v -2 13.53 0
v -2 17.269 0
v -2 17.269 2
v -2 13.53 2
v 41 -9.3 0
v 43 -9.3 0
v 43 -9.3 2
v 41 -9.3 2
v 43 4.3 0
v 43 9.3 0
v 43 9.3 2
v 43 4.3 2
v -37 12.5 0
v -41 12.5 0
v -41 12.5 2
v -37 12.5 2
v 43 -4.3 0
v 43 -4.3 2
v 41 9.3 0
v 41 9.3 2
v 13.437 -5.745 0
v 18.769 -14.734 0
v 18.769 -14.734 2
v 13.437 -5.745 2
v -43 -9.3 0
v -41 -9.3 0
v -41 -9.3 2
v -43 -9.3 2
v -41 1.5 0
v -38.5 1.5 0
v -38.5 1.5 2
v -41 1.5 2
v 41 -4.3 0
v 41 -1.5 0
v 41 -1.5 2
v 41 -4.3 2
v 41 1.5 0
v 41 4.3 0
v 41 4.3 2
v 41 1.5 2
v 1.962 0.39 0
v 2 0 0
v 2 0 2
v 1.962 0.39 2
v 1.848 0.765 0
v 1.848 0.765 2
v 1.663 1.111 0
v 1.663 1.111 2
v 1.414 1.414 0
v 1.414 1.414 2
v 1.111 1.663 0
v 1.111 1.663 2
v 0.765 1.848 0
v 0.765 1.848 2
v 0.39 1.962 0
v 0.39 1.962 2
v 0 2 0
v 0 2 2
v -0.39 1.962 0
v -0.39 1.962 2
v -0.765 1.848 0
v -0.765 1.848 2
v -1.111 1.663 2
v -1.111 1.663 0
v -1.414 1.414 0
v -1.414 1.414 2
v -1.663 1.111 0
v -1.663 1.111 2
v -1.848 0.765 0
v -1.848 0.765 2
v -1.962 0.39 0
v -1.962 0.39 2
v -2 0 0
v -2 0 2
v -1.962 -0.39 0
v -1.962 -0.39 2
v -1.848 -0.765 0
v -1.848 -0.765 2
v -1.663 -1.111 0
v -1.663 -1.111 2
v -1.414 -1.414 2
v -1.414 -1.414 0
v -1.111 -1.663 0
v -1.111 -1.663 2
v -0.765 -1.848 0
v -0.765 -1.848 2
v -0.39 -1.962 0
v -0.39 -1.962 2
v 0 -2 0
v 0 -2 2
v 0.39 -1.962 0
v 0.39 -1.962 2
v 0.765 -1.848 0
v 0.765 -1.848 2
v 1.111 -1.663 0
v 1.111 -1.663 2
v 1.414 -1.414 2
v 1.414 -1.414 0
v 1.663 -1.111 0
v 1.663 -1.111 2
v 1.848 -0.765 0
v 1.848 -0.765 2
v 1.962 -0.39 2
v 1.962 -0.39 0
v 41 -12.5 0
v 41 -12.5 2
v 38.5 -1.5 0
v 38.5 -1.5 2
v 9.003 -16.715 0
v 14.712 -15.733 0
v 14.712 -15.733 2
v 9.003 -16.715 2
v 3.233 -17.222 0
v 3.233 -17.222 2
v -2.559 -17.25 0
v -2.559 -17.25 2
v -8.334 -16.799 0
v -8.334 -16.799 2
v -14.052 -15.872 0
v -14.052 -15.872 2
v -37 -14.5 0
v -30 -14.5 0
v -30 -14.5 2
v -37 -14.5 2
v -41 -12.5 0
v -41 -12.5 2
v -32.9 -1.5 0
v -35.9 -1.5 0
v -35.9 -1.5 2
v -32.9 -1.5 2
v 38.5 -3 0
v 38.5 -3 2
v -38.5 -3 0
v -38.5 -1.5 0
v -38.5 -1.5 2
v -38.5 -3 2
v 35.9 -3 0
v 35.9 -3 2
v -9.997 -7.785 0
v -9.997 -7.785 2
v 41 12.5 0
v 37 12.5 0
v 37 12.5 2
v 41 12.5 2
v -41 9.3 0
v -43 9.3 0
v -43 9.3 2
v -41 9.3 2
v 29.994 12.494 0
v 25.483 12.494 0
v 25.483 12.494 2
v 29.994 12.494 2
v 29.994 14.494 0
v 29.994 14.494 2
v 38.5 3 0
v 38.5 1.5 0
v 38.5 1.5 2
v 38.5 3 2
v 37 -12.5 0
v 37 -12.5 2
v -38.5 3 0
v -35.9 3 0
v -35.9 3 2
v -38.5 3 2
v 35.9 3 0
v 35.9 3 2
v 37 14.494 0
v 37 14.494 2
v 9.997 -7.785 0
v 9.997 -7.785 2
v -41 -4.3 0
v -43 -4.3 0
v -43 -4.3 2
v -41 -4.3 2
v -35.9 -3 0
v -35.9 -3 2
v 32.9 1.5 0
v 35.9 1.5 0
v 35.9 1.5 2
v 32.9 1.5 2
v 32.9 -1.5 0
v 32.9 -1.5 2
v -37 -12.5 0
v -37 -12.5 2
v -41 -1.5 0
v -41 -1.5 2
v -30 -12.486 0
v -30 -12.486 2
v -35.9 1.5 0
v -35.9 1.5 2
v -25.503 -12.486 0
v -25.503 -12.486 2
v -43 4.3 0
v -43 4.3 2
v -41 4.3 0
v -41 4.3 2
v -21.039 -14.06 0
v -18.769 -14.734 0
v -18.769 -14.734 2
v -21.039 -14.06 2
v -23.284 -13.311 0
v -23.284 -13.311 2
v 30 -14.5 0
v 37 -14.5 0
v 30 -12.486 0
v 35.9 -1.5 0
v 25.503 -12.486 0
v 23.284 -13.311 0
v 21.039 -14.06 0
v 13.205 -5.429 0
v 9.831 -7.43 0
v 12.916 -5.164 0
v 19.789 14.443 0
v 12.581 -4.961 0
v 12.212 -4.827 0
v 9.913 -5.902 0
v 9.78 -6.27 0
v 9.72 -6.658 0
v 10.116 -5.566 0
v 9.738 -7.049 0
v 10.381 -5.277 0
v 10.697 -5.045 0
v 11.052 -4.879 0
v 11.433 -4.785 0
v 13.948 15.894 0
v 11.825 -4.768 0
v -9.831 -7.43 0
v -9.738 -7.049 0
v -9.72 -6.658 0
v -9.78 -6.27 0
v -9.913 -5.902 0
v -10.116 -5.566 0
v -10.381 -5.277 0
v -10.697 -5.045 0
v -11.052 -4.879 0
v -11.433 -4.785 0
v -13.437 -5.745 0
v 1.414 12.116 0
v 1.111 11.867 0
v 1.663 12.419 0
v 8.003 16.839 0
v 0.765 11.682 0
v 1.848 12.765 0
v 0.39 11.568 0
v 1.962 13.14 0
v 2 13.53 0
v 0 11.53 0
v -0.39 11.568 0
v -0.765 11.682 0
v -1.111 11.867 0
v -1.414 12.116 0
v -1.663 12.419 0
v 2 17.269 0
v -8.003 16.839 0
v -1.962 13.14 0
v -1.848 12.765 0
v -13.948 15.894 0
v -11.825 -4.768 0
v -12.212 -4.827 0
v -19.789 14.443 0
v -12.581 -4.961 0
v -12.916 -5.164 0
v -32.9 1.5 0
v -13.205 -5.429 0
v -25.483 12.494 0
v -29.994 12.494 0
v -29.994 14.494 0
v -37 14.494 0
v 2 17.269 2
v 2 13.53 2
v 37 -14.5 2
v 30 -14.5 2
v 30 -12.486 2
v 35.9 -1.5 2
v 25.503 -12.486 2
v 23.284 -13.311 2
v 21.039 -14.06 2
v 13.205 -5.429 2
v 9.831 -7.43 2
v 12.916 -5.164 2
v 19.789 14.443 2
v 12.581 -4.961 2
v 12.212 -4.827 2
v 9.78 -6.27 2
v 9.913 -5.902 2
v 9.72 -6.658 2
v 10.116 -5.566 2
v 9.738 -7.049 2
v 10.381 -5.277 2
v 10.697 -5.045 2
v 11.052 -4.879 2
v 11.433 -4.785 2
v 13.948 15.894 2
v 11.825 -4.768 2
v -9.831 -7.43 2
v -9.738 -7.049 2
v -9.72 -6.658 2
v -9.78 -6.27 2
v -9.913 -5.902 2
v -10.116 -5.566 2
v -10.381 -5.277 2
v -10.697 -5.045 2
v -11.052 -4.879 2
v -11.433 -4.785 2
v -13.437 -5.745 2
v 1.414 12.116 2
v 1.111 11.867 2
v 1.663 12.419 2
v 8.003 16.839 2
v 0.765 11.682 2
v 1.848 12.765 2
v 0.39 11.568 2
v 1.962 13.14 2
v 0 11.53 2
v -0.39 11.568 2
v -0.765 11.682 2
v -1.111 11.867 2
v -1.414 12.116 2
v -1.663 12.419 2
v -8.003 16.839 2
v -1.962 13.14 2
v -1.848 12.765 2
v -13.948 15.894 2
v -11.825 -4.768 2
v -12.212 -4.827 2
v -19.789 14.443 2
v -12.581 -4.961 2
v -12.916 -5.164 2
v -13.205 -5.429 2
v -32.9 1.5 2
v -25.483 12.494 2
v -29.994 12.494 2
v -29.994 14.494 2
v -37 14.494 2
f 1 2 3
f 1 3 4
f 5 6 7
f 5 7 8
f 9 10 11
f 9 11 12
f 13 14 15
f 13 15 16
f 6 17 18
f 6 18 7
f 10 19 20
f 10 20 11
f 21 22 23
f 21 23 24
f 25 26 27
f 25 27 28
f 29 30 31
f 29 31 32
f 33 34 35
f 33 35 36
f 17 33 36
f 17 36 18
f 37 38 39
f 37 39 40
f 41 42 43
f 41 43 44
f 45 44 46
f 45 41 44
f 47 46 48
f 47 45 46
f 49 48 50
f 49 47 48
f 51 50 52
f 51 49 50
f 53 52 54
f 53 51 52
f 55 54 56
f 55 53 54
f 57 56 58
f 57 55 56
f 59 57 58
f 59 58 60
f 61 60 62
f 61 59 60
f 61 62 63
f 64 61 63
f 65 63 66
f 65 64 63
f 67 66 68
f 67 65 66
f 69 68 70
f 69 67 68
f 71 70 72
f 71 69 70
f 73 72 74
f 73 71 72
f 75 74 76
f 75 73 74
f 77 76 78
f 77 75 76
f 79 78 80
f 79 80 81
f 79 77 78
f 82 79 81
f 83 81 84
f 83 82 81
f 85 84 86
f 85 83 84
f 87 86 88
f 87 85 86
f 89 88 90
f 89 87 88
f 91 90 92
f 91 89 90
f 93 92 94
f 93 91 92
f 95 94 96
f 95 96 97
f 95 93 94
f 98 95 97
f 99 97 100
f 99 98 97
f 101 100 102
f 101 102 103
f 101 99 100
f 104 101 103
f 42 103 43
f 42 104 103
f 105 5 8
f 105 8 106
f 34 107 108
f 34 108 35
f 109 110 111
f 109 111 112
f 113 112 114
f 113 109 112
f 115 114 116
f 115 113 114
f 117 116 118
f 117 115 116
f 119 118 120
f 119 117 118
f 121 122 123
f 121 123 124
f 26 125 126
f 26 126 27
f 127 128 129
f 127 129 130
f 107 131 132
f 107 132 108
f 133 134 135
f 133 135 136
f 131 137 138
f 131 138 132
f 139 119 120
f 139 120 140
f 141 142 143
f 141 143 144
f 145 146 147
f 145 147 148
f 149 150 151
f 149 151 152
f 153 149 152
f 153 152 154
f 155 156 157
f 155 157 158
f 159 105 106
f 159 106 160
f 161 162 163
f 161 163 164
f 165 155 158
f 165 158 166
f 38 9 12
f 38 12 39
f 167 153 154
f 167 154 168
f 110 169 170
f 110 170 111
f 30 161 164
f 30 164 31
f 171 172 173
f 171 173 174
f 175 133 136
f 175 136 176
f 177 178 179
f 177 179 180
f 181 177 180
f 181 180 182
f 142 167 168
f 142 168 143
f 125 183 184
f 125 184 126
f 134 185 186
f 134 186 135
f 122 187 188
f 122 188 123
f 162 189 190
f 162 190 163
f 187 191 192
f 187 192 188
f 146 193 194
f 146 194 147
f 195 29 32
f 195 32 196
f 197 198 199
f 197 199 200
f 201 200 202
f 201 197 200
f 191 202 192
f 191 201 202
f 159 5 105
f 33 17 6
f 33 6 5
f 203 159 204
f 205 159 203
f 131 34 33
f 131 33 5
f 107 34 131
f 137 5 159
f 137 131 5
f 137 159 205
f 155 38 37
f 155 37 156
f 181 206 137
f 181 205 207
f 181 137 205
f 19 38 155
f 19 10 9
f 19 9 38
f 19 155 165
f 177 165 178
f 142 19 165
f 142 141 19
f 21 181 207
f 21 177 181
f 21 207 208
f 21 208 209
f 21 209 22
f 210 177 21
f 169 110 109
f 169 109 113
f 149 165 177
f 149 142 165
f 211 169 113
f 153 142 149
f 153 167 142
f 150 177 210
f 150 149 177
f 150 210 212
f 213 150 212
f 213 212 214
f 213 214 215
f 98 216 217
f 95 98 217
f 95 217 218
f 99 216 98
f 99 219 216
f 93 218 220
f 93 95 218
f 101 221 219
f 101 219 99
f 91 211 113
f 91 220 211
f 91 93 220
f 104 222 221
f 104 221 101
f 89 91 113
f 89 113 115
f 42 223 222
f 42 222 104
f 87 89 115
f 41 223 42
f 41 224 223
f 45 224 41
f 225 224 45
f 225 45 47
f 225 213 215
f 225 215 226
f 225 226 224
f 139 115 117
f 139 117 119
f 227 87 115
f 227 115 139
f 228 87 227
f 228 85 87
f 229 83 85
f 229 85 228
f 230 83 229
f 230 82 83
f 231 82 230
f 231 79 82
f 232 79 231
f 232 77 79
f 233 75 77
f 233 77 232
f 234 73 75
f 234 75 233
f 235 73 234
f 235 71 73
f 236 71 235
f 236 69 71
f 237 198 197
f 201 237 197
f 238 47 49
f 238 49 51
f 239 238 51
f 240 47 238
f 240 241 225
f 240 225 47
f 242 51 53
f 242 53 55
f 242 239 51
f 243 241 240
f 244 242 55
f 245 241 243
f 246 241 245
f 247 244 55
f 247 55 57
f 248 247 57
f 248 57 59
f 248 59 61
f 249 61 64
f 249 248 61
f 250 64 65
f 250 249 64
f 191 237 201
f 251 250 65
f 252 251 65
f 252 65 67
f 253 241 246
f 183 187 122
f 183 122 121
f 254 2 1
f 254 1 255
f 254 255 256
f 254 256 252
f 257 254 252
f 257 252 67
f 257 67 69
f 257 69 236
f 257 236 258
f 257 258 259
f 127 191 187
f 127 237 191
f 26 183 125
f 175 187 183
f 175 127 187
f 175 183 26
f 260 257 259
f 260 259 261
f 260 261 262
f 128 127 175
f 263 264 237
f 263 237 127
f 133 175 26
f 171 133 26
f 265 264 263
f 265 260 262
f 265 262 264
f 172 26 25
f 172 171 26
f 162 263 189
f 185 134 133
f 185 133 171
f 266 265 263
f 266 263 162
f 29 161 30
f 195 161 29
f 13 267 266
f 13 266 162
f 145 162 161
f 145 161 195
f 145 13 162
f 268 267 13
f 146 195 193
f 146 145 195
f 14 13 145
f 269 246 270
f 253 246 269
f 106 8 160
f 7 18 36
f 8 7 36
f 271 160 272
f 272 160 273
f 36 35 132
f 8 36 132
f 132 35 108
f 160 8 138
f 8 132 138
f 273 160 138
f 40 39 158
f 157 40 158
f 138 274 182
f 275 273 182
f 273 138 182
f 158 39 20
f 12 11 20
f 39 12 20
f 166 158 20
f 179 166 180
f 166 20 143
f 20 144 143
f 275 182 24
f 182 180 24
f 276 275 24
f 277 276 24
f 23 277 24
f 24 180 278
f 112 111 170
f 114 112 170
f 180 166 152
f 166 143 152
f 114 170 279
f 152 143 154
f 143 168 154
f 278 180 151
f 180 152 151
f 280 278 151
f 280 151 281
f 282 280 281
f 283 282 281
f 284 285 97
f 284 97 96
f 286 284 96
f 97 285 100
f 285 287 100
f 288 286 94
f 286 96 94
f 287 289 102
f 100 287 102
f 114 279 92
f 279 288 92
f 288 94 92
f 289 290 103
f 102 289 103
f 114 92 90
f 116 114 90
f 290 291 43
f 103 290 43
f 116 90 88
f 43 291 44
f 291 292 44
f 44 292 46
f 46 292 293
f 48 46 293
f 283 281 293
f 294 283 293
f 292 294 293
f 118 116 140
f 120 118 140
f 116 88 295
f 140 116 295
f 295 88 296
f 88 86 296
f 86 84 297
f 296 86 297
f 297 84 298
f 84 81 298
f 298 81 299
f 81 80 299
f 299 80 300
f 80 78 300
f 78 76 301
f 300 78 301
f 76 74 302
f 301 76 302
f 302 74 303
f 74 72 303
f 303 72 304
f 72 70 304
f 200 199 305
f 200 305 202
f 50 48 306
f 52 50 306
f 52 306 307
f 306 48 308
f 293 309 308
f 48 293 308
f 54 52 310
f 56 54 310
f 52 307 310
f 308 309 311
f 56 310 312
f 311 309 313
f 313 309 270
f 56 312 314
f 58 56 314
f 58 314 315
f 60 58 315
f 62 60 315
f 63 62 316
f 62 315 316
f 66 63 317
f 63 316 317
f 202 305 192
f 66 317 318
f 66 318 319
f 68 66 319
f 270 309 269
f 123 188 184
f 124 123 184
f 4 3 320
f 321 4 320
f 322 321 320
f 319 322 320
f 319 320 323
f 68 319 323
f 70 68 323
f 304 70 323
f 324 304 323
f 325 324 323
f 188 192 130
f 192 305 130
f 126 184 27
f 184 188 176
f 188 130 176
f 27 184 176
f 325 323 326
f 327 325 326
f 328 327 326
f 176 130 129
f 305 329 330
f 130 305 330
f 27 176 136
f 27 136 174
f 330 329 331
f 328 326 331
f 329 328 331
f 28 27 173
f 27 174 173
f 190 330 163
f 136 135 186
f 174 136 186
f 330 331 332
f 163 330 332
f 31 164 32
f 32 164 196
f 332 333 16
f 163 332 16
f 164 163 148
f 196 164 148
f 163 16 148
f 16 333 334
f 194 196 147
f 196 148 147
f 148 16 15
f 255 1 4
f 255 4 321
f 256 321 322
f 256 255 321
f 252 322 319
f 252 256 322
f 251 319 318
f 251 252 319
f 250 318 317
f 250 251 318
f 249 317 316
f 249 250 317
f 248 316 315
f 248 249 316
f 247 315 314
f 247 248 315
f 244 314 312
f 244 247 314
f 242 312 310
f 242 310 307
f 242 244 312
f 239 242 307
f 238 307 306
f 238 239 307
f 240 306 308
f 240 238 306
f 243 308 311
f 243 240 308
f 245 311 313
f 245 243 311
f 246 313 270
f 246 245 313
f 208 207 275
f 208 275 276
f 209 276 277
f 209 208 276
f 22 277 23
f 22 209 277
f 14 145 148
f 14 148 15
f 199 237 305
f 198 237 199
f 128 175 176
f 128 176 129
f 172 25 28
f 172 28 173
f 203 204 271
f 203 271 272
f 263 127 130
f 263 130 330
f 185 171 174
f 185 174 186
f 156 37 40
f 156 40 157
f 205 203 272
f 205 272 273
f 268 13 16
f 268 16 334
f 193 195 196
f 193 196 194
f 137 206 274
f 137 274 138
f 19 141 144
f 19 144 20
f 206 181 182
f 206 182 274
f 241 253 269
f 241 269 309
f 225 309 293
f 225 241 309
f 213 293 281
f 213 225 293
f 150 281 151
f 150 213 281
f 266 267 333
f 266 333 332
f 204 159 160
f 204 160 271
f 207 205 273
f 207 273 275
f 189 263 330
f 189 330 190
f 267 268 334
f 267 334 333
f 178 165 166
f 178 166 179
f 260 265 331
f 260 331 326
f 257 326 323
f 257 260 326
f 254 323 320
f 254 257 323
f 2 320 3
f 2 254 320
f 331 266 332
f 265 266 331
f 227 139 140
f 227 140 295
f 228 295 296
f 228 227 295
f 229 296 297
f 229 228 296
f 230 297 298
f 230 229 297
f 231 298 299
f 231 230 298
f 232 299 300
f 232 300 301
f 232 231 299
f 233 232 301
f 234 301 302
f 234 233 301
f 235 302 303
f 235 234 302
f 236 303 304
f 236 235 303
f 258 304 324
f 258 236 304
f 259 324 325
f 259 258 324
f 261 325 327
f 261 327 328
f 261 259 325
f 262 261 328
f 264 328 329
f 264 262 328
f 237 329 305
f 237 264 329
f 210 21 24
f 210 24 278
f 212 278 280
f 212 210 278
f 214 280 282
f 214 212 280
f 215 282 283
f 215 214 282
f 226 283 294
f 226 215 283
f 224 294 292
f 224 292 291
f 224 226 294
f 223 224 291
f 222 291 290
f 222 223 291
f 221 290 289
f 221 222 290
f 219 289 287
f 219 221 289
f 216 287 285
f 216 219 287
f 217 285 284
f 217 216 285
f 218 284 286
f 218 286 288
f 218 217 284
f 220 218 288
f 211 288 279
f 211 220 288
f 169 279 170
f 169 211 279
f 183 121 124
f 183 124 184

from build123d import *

# Parameters (mm, degrees)
SKETCH_1_R      = 2
EXTRUDE_2_DEPTH = 2


with BuildPart() as part:
    # 草图1 → 凸台-拉伸2 (new body)
    with BuildSketch(Plane.XY):
        with BuildLine():
            Line((-29.994433528, 12.494433528), (-25.48340173, 12.494433528))
            ThreePointArc((-25.48340173, 12.494433528), (-13.947547573, 15.894235428), (-2, 17.269259451))
            Line((-2, 17.269259451), (-2, 13.53))
            ThreePointArc((-2, 13.53), (0, 11.53), (2, 13.53))
            Line((2, 13.53), (2, 17.269259451))
            ThreePointArc((2, 17.269259451), (13.947547573, 15.894235428), (25.48340173, 12.494433528))
            Line((25.48340173, 12.494433528), (29.994433528, 12.494433528))
            Line((29.994433528, 12.494433528), (29.994433528, 14.494433528))
            Line((29.994433528, 14.494433528), (37, 14.494433528))
            Line((37, 14.494433528), (37, 12.5))
            Line((37, 12.5), (41, 12.5))
            Line((41, 12.5), (41, 9.3))
            Line((41, 9.3), (43, 9.3))
            Line((43, 9.3), (43, 4.3))
            Line((43, 4.3), (41, 4.3))
            Line((41, 4.3), (41, 1.5))
            Line((41, 1.5), (38.5, 1.5))
            Line((38.5, 1.5), (38.5, 3))
            Line((38.5, 3), (35.9, 3))
            Line((35.9, 3), (35.9, 1.5))
            Line((35.9, 1.5), (32.9, 1.5))
            Line((32.9, 1.5), (32.9, -1.5))
            Line((32.9, -1.5), (35.9, -1.5))
            Line((35.9, -1.5), (35.9, -3))
            Line((35.9, -3), (38.5, -3))
            Line((38.5, -3), (38.5, -1.5))
            Line((38.5, -1.5), (41, -1.5))
            Line((41, -1.5), (41, -4.3))
            Line((41, -4.3), (43, -4.3))
            Line((43, -4.3), (43, -9.3))
            Line((43, -9.3), (41, -9.3))
            Line((41, -9.3), (41, -12.5))
            Line((41, -12.5), (37, -12.5))
            Line((37, -12.5), (37, -14.5))
            Line((37, -14.5), (30, -14.5))
            Line((30, -14.5), (30, -12.485627756))
            Line((30, -12.485627756), (25.50333236, -12.485627756))
            ThreePointArc((25.50333236, -12.485627756), (22.164855453, -13.695011333), (18.769346851, -14.733547814))
            Line((18.769346851, -14.733547814), (13.437476273, -5.744669088))
            ThreePointArc((13.437476273, -5.744669088), (10.696992802, -5.04484744), (9.997171153, -7.785330912))
            Line((9.997171153, -7.785330912), (14.711679138, -15.733412155))
            ThreePointArc((14.711679138, -15.733412155), (0.337099689, -17.296013049), (-14.051862928, -15.871930634))
            Line((-14.051862928, -15.871930634), (-9.997171153, -7.785330912))
            ThreePointArc((-9.997171153, -7.785330912), (-10.696992802, -5.04484744), (-13.437476273, -5.744669088))
            Line((-13.437476273, -5.744669088), (-18.769346851, -14.733547814))
            ThreePointArc((-18.769346851, -14.733547814), (-22.164855453, -13.695011333), (-25.50333236, -12.485627756))
            Line((-25.50333236, -12.485627756), (-30, -12.485627756))
            Line((-30, -12.485627756), (-30, -14.5))
            Line((-30, -14.5), (-37, -14.5))
            Line((-37, -14.5), (-37, -12.5))
            Line((-37, -12.5), (-41, -12.5))
            Line((-41, -12.5), (-41, -9.3))
            Line((-41, -9.3), (-43, -9.3))
            Line((-43, -9.3), (-43, -4.3))
            Line((-43, -4.3), (-41, -4.3))
            Line((-41, -4.3), (-41, -1.5))
            Line((-41, -1.5), (-38.5, -1.5))
            Line((-38.5, -1.5), (-38.5, -3))
            Line((-38.5, -3), (-35.9, -3))
            Line((-35.9, -3), (-35.9, -1.5))
            Line((-35.9, -1.5), (-32.9, -1.5))
            Line((-32.9, -1.5), (-32.9, 1.5))
            Line((-32.9, 1.5), (-35.9, 1.5))
            Line((-35.9, 1.5), (-35.9, 3))
            Line((-35.9, 3), (-38.5, 3))
            Line((-38.5, 3), (-38.5, 1.5))
            Line((-38.5, 1.5), (-41, 1.5))
            Line((-41, 1.5), (-41, 4.3))
            Line((-41, 4.3), (-43, 4.3))
            Line((-43, 4.3), (-43, 9.3))
            Line((-43, 9.3), (-41, 9.3))
            Line((-41, 9.3), (-41, 12.5))
            Line((-41, 12.5), (-37, 12.5))
            Line((-37, 12.5), (-37, 14.494433528))
            Line((-37, 14.494433528), (-29.994433528, 14.494433528))
            Line((-29.994433528, 14.494433528), (-29.994433528, 12.494433528))
        make_face()
        Circle(SKETCH_1_R, mode=Mode.SUBTRACT)
    extrude(amount=EXTRUDE_2_DEPTH)


solid = part.part
